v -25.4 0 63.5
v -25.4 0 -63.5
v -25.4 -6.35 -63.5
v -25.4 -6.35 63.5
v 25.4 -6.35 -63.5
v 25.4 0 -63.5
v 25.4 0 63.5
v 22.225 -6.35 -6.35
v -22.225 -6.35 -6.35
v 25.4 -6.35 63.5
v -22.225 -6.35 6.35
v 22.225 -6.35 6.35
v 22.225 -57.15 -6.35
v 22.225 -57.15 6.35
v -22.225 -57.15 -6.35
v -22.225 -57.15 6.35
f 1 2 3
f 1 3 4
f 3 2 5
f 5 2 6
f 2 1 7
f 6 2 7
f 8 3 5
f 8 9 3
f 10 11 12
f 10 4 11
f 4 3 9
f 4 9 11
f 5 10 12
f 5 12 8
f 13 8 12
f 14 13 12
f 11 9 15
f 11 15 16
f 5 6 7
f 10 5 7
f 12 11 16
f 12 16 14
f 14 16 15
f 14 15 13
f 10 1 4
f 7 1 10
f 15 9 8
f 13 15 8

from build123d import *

# Parameters (mm, degrees)
F0_W     = 50.8
F0_H     = 127
F1_DEPTH = 6.35
F3_W     = 44.45
F3_H     = 12.7
F4_DEPTH = 50.8


with BuildPart() as f1:
    # F0 (on Front) → F1 (new body)
    with BuildSketch(Plane.XZ):
        Rectangle(F0_W, F0_H)
    extrude(amount=F1_DEPTH)

    # F3 (on face) → F4 (join)
    with BuildSketch(Plane.XZ.offset(6.35)):
        Rectangle(F3_W, F3_H)
    extrude(amount=F4_DEPTH)


solid = f1.part
